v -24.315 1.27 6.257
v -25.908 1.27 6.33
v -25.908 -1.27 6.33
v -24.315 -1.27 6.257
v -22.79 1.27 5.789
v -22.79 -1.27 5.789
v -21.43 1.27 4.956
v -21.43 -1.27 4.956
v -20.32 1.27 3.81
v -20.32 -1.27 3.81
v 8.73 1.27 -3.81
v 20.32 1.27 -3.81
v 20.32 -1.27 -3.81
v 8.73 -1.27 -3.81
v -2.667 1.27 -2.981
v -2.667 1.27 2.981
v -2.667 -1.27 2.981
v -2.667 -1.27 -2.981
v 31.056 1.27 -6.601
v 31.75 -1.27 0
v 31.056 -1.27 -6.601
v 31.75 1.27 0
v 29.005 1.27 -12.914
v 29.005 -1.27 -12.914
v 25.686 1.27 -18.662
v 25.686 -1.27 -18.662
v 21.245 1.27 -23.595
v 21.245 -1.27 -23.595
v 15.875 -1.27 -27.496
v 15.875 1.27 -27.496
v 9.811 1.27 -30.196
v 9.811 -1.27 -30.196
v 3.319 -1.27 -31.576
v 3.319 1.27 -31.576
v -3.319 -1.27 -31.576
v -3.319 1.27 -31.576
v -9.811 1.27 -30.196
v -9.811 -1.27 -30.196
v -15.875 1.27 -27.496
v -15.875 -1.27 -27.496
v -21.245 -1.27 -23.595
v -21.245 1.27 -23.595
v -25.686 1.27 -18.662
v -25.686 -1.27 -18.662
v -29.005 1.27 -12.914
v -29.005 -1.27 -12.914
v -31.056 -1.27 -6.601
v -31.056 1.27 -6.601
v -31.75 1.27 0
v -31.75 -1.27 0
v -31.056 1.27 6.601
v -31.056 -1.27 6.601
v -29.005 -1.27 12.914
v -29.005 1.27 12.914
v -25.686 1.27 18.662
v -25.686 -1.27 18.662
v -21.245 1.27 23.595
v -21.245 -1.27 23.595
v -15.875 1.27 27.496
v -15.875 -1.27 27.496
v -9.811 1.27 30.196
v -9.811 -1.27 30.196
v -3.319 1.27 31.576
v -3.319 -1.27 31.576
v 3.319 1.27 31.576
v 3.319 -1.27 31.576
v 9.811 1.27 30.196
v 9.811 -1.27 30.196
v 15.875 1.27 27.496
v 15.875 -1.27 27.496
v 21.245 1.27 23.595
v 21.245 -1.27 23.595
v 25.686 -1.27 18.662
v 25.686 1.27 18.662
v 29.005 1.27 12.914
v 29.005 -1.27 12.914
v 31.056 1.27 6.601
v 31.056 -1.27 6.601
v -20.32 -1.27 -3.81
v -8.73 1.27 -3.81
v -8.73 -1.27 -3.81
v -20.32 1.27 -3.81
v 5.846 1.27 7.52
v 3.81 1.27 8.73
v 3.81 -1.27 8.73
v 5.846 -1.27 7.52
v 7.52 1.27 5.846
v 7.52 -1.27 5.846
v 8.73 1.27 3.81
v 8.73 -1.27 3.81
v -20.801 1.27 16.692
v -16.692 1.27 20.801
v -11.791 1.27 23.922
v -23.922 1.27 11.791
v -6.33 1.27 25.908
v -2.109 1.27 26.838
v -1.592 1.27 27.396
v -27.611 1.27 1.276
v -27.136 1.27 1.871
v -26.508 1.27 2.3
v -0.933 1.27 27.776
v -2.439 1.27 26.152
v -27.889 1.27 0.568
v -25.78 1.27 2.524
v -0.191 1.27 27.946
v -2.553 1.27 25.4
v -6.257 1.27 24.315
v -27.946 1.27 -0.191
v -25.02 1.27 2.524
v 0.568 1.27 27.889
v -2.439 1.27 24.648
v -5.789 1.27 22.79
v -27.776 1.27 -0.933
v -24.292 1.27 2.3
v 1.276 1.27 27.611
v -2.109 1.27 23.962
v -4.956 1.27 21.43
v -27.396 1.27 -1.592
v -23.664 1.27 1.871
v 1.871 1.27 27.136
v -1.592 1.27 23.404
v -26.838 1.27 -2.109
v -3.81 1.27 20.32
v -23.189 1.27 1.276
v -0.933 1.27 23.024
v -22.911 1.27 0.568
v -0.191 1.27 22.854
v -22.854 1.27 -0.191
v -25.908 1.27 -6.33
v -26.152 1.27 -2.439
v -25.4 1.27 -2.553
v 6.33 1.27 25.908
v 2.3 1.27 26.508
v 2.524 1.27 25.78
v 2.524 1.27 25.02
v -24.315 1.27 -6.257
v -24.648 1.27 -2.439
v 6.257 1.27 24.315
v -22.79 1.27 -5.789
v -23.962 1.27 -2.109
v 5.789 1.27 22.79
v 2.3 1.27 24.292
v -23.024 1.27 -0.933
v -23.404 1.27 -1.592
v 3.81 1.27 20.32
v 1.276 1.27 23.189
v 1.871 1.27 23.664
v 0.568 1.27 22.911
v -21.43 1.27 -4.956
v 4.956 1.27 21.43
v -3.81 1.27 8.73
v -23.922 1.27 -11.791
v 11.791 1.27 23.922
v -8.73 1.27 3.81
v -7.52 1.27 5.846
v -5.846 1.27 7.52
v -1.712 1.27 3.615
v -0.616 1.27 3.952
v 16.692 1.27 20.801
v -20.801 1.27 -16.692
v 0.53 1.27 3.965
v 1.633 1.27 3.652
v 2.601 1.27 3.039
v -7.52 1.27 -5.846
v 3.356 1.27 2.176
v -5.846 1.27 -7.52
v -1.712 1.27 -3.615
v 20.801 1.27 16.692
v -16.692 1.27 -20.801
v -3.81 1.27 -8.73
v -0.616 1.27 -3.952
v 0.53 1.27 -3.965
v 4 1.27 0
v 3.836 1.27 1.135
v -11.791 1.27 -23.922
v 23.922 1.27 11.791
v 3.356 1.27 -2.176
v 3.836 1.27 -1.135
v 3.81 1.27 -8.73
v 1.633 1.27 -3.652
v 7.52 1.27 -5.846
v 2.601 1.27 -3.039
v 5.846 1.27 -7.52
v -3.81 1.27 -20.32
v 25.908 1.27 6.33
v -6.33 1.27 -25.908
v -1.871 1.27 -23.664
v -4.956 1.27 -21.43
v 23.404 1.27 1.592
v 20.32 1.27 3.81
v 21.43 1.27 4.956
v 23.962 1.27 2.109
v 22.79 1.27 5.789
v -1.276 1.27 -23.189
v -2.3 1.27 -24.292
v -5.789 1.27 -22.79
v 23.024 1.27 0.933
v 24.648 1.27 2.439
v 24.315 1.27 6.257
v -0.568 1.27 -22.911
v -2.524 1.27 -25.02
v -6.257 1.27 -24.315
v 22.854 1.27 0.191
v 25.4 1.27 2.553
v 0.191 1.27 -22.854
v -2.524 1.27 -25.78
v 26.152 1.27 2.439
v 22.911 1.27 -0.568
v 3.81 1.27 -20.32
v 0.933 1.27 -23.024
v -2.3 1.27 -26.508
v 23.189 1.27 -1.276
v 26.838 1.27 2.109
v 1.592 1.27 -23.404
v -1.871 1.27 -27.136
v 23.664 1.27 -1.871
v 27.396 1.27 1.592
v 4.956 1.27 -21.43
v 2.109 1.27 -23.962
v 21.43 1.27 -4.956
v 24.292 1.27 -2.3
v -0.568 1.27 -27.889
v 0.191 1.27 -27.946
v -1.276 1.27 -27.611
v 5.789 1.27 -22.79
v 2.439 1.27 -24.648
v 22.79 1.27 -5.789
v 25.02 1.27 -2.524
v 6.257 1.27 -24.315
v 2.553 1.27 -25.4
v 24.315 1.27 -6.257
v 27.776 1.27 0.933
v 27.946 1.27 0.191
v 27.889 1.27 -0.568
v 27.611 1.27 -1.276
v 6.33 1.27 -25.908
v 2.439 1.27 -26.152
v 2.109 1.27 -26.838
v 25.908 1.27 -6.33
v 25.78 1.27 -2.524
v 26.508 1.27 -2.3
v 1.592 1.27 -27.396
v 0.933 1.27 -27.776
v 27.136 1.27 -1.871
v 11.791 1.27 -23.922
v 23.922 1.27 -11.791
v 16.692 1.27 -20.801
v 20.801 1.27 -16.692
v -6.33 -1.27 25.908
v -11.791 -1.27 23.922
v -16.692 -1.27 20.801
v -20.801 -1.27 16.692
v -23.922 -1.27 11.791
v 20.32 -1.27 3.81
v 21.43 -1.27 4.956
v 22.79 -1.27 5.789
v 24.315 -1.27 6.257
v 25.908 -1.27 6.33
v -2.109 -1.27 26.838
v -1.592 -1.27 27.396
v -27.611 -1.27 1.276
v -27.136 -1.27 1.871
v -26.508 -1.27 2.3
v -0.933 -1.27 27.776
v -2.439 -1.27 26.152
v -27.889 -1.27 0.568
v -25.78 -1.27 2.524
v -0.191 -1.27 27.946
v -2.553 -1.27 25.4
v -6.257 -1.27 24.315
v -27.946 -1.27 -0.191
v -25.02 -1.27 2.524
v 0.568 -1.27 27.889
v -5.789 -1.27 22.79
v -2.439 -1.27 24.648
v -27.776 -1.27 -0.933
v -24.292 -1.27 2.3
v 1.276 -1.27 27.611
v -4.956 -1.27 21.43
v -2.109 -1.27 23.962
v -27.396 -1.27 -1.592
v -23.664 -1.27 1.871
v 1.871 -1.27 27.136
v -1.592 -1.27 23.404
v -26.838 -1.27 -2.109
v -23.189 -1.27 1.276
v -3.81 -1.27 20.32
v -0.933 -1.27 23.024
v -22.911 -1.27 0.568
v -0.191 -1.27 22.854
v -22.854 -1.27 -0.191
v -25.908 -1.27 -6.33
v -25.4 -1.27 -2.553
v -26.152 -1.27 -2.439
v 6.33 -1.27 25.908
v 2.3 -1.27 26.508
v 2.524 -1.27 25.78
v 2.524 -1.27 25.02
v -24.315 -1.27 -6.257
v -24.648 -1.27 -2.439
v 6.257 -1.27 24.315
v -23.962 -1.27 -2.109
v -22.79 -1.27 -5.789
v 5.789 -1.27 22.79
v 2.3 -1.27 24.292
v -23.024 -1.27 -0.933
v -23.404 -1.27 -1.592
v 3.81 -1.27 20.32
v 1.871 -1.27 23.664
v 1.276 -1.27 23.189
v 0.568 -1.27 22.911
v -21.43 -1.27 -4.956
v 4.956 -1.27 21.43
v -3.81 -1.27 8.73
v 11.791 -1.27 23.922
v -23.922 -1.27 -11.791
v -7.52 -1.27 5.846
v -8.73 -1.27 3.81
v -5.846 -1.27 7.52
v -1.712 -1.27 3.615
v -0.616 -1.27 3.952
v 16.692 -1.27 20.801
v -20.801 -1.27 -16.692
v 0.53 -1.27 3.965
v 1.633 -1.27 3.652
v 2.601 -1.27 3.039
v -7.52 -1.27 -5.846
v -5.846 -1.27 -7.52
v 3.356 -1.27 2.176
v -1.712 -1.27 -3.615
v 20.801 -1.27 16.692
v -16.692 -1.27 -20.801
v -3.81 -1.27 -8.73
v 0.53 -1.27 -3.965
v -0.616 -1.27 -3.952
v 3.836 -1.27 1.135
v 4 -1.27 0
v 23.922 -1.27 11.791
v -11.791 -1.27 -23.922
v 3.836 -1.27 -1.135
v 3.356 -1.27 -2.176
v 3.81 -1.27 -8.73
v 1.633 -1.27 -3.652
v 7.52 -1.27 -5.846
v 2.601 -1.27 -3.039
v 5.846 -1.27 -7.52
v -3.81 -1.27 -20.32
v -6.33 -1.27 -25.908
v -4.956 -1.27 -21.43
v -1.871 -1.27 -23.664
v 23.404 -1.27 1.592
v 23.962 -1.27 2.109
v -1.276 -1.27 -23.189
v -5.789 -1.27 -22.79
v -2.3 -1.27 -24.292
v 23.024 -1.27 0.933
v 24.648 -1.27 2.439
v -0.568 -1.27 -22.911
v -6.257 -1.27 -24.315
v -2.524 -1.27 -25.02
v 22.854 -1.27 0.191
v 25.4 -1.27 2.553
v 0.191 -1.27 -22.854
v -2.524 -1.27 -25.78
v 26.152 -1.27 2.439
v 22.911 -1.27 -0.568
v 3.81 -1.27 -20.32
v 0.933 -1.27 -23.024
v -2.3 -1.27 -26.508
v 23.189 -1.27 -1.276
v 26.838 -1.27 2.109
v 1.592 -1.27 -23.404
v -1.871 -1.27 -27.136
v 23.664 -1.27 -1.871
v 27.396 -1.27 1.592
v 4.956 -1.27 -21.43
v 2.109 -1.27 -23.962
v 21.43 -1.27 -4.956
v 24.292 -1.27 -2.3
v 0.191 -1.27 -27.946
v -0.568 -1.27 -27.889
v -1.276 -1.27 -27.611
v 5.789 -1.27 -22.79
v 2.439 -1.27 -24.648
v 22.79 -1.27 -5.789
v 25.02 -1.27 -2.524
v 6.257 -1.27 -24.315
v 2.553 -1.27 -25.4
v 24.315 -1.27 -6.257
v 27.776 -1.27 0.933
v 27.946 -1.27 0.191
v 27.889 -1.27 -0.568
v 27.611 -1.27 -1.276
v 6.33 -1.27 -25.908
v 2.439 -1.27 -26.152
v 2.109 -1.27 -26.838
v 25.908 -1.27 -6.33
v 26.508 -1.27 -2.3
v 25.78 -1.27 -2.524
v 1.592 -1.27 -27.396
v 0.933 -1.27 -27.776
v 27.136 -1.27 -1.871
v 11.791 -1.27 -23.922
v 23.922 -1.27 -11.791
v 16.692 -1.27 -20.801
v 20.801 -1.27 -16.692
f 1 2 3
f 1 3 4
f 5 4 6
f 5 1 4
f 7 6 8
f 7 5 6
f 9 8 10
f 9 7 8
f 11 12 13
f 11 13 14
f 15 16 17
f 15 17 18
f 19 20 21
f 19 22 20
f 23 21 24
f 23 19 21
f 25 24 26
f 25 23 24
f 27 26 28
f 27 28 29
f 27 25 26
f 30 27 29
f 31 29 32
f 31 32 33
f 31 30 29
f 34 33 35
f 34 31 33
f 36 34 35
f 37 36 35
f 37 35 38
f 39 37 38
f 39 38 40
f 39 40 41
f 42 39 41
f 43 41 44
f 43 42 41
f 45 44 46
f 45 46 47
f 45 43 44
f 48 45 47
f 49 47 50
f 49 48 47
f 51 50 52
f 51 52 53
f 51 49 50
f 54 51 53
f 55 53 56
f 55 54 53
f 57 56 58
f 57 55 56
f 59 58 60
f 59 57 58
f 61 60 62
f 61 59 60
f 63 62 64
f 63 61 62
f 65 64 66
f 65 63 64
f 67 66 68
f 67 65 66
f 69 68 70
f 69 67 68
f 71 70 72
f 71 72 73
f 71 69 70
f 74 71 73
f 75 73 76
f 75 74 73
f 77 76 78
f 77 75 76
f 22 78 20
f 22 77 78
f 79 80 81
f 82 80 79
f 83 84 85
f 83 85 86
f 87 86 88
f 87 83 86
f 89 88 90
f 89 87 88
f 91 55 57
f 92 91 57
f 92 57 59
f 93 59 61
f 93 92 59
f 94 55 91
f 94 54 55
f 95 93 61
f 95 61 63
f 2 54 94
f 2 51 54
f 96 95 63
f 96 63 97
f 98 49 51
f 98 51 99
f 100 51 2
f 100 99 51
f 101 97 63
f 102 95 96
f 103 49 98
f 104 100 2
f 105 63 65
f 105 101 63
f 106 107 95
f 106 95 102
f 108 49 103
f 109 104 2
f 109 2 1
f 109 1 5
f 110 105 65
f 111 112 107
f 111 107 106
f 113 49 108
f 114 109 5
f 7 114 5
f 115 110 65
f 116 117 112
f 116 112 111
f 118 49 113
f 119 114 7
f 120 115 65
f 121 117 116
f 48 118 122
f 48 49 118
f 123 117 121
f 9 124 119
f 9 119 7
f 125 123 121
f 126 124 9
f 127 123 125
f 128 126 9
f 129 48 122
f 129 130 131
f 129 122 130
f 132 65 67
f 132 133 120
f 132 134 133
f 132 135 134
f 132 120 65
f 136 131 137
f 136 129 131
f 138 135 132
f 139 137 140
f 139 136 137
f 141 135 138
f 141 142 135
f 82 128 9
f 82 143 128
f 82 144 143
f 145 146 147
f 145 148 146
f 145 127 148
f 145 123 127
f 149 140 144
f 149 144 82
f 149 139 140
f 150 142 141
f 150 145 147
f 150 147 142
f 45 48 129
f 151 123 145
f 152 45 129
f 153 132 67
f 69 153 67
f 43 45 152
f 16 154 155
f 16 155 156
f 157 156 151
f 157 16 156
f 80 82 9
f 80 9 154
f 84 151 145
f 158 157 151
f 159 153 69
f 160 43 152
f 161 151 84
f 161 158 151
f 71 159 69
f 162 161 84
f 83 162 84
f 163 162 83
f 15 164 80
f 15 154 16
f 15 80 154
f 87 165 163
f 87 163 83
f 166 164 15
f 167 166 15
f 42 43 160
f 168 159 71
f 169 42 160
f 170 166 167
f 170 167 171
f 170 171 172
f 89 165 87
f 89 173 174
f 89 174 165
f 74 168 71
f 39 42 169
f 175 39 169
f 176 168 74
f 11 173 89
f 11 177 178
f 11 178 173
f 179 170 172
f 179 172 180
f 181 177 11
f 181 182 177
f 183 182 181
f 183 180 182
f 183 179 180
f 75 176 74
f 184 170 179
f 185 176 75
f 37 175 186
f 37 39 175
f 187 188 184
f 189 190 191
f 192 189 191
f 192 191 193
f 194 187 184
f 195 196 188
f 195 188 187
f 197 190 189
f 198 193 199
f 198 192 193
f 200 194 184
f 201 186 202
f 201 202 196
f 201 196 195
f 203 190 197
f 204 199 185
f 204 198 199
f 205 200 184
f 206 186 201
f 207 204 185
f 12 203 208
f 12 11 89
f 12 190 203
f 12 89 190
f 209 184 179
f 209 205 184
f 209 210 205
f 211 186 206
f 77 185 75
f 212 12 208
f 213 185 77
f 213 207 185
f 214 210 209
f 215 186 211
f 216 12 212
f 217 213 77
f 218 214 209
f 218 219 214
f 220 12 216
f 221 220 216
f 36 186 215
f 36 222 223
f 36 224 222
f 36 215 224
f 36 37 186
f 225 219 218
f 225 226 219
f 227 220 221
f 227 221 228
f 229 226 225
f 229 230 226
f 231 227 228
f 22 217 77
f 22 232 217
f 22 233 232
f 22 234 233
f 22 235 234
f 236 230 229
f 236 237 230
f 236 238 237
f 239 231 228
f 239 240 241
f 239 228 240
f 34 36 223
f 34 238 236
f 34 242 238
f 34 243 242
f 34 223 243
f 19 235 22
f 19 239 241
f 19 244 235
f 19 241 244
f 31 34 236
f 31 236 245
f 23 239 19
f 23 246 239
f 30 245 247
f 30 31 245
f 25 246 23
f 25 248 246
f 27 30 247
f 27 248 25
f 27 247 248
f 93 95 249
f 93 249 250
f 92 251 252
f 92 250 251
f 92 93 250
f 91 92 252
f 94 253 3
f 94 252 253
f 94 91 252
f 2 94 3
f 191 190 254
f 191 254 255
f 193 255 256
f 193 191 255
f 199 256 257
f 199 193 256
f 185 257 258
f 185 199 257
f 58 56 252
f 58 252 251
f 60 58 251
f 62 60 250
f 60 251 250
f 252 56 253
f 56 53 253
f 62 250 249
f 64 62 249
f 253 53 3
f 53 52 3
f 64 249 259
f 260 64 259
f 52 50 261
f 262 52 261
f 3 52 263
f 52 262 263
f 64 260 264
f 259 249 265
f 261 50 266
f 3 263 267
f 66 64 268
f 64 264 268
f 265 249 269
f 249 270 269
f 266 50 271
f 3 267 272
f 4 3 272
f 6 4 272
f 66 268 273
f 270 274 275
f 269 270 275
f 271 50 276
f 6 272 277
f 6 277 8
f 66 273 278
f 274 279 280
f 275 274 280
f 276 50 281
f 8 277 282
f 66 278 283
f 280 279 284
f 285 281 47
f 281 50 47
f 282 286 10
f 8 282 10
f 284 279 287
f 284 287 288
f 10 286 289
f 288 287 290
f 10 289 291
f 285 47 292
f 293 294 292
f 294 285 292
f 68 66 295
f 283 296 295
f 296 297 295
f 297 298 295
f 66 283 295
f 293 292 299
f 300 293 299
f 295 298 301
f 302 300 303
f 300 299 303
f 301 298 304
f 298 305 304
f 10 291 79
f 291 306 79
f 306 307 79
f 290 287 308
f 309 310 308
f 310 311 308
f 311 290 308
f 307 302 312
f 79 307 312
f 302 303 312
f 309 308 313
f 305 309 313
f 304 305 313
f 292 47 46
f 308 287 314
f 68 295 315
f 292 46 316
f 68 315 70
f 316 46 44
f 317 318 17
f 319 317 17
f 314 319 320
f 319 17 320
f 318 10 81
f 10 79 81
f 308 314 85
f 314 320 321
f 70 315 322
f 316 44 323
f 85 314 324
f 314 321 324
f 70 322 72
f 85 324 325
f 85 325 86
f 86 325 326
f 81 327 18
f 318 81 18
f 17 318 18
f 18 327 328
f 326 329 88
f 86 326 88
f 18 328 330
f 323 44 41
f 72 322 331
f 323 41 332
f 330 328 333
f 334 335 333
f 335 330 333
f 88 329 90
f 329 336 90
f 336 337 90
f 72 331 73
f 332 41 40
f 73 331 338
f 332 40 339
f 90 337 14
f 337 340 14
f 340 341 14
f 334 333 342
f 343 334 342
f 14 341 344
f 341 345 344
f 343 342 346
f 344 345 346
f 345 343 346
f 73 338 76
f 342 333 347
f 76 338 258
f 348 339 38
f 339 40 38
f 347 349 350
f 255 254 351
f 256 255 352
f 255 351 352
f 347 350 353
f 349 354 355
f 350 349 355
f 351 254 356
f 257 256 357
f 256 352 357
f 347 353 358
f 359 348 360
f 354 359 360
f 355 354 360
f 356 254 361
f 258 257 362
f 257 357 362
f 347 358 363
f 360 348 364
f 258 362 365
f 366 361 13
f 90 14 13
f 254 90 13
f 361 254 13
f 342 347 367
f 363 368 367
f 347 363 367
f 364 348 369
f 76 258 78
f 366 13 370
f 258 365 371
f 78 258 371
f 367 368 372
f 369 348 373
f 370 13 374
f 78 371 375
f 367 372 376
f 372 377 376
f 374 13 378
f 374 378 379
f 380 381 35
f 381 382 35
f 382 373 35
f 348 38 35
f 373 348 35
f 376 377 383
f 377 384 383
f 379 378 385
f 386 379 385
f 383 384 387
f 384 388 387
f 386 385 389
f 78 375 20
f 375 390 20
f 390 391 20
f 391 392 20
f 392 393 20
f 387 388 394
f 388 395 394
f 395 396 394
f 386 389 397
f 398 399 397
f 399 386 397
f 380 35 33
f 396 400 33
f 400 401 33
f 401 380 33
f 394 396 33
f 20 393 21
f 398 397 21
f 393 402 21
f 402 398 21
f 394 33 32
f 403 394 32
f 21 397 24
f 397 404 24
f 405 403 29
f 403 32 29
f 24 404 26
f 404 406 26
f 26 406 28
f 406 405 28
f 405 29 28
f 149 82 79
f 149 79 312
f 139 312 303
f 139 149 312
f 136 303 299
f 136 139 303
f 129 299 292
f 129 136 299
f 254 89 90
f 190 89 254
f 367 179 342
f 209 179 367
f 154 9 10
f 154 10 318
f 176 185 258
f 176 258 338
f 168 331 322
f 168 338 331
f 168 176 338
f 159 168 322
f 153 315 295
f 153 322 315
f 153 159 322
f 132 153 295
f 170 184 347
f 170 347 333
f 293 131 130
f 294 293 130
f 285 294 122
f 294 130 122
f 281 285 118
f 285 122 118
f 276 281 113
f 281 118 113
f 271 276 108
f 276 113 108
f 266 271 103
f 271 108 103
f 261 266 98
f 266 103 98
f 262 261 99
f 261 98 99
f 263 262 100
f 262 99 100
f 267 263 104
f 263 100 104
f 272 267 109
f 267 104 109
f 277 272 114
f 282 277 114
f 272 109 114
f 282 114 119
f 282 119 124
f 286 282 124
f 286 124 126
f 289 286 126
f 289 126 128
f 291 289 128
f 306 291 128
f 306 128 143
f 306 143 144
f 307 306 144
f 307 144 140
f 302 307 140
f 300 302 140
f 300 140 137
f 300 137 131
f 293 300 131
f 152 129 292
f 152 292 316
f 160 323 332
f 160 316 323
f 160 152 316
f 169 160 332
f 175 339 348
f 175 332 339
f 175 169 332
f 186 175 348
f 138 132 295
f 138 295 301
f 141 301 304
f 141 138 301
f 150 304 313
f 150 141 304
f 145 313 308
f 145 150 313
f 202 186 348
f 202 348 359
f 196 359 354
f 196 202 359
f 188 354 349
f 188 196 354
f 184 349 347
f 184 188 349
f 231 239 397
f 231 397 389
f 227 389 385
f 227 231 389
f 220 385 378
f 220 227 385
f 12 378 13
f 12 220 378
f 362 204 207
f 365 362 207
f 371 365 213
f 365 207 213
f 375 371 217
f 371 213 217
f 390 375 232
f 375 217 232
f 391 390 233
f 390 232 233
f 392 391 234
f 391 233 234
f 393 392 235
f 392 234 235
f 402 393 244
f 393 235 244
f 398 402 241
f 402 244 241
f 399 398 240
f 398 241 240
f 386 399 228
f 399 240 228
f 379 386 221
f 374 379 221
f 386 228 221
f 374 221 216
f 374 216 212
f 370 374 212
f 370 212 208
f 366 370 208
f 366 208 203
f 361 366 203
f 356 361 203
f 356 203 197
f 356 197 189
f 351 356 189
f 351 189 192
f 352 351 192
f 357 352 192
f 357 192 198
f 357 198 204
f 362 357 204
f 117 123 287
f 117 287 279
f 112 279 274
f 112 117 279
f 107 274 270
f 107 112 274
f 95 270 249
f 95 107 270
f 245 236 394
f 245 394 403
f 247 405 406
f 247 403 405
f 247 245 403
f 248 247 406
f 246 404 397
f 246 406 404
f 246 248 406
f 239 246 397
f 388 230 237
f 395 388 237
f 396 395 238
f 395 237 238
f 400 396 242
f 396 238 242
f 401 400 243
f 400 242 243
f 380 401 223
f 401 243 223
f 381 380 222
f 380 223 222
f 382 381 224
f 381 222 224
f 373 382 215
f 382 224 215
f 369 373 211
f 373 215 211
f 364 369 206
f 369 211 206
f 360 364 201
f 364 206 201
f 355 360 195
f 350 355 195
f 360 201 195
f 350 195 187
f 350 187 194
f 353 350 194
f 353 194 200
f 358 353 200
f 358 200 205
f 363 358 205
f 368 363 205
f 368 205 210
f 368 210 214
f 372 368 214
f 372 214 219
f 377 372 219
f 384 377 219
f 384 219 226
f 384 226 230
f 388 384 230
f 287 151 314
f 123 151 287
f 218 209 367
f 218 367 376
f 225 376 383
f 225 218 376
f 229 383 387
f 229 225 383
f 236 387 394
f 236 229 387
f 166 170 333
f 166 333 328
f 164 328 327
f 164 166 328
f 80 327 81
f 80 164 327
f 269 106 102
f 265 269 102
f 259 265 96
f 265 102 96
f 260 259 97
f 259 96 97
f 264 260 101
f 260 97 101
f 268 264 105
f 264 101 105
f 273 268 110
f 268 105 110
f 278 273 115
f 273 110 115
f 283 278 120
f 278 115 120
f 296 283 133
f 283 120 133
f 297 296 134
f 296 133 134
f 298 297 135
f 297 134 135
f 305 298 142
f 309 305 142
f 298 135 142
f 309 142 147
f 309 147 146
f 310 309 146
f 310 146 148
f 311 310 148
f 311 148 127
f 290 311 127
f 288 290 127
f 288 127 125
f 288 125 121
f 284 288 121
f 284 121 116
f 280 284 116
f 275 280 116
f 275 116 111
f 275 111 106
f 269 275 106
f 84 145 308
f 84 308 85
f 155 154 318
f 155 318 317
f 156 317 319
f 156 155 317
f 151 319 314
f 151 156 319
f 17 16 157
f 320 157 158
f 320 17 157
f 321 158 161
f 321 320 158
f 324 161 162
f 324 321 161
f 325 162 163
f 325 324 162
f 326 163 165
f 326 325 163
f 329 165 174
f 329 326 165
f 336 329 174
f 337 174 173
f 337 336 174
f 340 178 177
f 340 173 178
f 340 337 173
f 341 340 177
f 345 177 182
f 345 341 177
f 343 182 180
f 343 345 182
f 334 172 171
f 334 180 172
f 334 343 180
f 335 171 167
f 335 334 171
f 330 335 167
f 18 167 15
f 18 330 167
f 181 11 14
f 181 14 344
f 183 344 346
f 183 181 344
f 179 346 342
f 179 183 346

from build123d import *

# Parameters (mm, degrees)
SKETCH1_R           = 31.75
SKETCH1_R_2         = 4.000000128
BOSS_EXTRUDE1_DEPTH = 1.27
BOSS_EXTRUDE3_DEPTH = 2.54
SKETCH3_R           = 2.5527
CUT_EXTRUDE1_DEPTH  = 3.54
CUT_EXTRUDE2_DEPTH  = 3.54
CIRPATTERN1_COUNT   = 4


with BuildPart() as part:
    # Sketch1 → Boss-Extrude1 (new body, symmetric)
    with BuildSketch(Plane(origin=(0, 0, 0), x_dir=(1, 0, 0), z_dir=(0, 1, 0))):
        Circle(SKETCH1_R)
        Circle(SKETCH1_R_2, mode=Mode.SUBTRACT)
    extrude(amount=BOSS_EXTRUDE1_DEPTH, both=True)

    # Sketch2 → Boss-Extrude3 (add, through all)
    with BuildSketch(Plane(origin=(0, 1.27, 0), x_dir=(1, 0, 0), z_dir=(0, 1, 0))):
        with BuildLine():
            Line((-2.667, -2.981125966), (-2.667, 2.981125966))
            ThreePointArc((-2.667, 2.981125966), (-4.000000128, 0), (-2.667, -2.981125966))
        make_face()
    extrude(amount=-BOSS_EXTRUDE3_DEPTH)

    # Sketch3 → Cut-Extrude1 (cut, through all)
    with BuildSketch(Plane(origin=(0, 1.27, 0), x_dir=(1, 0, 0), z_dir=(0, 1, 0))):
        with Locations((0, 25.4)):
            Circle(SKETCH3_R)
    cut_extrude1 = extrude(amount=-CUT_EXTRUDE1_DEPTH, mode=Mode.SUBTRACT)

    # Sketch4 → Cut-Extrude2 (cut, through all)
    with BuildSketch(Plane(origin=(0, 1.27, 0), x_dir=(1, 0, 0), z_dir=(0, 1, 0))):
        with BuildLine():
            Line((3.81, 8.729806699), (3.81, 20.32))
            ThreePointArc((3.81, 20.32), (5.788743237, 22.789836838), (6.329647384, 25.908))
            ThreePointArc((6.329647384, 25.908), (18.858537854, 18.858537854), (25.908, 6.329647384))
            ThreePointArc((25.908, 6.329647384), (22.789836838, 5.788743237), (20.32, 3.81))
            Line((20.32, 3.81), (8.729806699, 3.81))
            ThreePointArc((8.729806699, 3.81), (6.735192091, 6.735192091), (3.81, 8.729806699))
        make_face()
    cut_extrude2 = extrude(amount=-CUT_EXTRUDE2_DEPTH, mode=Mode.SUBTRACT)

    # CirPattern1: Cut-Extrude1, Cut-Extrude2 ×4 about axis
    cirpattern1_axis = Axis((0, 0, 0), (0, 1, 0))
    for i in range(1, CIRPATTERN1_COUNT):
        add(cut_extrude1.rotate(cirpattern1_axis, i * 360 / CIRPATTERN1_COUNT), mode=Mode.SUBTRACT)
        add(cut_extrude2.rotate(cirpattern1_axis, i * 360 / CIRPATTERN1_COUNT), mode=Mode.SUBTRACT)


solid = part.part
